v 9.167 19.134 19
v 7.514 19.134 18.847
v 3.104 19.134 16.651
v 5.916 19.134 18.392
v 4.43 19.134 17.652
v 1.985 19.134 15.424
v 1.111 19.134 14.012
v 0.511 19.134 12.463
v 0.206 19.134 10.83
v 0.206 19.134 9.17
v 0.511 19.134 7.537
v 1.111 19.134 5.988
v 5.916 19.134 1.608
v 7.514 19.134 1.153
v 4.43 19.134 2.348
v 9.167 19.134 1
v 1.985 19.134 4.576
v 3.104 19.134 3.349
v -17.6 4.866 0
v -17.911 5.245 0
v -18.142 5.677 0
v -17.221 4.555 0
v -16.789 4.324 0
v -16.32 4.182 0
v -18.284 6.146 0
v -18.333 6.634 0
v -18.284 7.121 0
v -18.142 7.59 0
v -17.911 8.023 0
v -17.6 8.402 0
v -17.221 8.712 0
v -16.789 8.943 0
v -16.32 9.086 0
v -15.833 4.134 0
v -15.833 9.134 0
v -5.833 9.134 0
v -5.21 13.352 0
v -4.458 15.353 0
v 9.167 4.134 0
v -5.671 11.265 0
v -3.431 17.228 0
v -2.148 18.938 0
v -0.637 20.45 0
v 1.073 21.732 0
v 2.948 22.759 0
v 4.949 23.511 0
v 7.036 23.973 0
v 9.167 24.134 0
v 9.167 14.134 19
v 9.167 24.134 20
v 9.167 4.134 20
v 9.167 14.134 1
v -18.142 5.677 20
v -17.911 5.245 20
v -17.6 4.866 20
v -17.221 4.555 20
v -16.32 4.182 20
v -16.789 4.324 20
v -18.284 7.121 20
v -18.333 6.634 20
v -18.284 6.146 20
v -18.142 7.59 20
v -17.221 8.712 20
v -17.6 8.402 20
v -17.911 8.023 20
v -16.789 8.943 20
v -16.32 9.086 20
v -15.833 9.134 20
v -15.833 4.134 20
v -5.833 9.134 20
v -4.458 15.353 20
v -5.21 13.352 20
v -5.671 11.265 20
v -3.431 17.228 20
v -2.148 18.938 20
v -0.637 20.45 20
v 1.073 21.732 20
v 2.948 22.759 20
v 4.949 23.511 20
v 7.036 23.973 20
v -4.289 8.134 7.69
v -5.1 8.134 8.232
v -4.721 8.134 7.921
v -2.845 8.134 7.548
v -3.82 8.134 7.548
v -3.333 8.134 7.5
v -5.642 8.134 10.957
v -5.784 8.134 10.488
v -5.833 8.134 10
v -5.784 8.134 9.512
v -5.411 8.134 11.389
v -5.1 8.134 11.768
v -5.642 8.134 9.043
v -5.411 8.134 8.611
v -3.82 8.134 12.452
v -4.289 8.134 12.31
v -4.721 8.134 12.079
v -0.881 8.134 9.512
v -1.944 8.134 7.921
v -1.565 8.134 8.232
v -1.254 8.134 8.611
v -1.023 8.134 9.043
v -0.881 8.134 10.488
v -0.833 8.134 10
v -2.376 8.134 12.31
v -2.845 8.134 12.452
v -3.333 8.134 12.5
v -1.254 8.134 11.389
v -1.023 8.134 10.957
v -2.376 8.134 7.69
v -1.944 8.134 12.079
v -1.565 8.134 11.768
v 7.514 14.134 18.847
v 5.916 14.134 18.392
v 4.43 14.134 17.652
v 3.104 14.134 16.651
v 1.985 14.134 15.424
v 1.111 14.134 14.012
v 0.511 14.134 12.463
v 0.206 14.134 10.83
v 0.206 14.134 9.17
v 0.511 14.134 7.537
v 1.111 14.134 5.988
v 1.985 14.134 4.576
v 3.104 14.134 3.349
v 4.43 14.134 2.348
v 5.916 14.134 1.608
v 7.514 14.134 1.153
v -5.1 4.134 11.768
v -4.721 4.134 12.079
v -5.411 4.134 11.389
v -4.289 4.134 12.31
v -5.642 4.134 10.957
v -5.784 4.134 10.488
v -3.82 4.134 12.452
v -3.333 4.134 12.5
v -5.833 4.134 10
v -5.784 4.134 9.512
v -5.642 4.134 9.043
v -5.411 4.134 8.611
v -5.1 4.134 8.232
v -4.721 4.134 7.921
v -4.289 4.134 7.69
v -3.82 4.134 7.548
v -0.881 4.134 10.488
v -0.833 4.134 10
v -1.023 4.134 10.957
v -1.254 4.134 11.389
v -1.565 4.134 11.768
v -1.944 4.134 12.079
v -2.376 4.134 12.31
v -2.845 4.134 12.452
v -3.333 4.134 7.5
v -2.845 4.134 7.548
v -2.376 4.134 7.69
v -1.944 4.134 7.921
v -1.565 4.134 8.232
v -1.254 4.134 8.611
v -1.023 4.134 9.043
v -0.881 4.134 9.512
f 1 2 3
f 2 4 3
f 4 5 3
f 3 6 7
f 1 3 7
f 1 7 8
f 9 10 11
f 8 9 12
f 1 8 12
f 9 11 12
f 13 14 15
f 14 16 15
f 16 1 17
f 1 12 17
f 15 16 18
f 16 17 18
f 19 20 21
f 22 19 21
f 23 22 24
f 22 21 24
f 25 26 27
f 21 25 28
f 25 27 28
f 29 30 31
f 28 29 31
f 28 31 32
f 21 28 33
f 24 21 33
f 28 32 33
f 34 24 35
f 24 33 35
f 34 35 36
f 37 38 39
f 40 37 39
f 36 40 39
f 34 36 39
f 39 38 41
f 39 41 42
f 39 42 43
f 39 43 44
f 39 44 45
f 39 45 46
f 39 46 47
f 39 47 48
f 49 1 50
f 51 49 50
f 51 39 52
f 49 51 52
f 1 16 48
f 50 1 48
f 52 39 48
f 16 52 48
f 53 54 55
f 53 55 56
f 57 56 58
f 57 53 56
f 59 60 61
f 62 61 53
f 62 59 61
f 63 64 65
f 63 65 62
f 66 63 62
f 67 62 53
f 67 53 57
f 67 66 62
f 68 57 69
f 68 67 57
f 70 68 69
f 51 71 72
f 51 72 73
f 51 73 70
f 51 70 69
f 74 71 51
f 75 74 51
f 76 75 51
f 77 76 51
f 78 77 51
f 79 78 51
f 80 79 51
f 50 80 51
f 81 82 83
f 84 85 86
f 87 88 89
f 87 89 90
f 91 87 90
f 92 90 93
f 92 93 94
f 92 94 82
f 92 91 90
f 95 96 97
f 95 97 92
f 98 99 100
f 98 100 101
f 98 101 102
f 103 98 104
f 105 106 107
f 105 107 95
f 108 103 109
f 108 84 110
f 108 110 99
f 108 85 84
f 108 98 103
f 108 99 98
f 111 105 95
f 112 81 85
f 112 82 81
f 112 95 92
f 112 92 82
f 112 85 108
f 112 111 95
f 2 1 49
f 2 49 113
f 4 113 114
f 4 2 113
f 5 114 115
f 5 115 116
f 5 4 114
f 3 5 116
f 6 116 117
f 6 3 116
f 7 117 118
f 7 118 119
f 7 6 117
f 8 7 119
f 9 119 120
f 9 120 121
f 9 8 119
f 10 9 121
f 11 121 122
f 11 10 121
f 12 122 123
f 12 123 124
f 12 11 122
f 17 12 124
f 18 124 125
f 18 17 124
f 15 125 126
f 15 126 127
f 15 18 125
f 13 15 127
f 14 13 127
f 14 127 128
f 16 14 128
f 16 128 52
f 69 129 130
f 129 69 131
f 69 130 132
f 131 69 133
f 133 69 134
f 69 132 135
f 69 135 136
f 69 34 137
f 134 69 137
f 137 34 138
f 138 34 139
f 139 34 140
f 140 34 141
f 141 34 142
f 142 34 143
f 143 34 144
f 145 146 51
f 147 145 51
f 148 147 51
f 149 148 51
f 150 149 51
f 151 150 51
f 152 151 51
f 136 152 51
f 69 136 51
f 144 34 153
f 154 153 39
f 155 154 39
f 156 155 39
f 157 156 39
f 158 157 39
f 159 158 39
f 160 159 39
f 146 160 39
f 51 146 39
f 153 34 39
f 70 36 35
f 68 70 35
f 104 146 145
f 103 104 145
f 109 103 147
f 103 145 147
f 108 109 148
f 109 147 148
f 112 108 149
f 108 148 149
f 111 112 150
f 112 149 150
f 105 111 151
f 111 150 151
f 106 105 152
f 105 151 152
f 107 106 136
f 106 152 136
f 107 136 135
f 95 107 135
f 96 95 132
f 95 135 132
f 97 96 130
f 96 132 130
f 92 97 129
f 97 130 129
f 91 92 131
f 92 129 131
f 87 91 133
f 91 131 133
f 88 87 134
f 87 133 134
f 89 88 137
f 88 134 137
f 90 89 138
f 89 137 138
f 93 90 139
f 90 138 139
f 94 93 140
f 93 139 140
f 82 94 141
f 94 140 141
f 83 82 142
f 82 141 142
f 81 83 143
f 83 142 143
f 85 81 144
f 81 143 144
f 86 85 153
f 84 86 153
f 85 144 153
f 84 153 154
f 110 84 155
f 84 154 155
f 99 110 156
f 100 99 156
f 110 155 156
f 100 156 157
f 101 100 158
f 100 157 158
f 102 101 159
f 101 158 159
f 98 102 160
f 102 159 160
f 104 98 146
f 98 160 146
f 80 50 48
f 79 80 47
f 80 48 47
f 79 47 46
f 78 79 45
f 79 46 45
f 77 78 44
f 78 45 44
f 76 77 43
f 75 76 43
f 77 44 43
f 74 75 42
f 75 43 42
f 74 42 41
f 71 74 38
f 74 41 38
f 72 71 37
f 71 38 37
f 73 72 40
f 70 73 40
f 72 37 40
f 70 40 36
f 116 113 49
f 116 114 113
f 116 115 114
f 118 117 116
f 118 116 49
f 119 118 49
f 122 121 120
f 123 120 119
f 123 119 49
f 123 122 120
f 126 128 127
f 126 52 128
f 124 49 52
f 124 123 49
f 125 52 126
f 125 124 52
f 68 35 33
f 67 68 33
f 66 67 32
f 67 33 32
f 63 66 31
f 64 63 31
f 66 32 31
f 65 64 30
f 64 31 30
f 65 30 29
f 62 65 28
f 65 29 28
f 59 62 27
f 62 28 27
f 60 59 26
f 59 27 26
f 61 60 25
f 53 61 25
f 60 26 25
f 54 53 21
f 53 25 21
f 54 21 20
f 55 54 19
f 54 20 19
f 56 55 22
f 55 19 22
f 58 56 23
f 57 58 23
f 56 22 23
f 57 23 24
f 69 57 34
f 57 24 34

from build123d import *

# Parameters (mm, degrees)
F1_DEPTH = 20
F2_W     = 5
F2_H     = 9
F4_R     = 2.5
F5_DEPTH = 4


with BuildPart() as f1:
    # F0 (on Top) → F1 (new body)
    with BuildSketch(Plane.XY):
        with BuildLine():
            ThreePointArc((-15.832526, 9.133746), (-18.332526, 6.633745), (-15.832526, 4.133745))
            Line((-15.832526, 4.133745), (9.167474, 4.133745))
            Line((9.167474, 4.133745), (9.167474, 24.133746))
            ThreePointArc((9.167474, 24.133746), (-1.41941, 19.72063), (-5.832526, 9.133746))
            Line((-5.832526, 9.133746), (-15.832526, 9.133746))
        make_face()
    extrude(amount=F1_DEPTH)

    # F2 (on face) → F3 (revolve, cut)
    with BuildSketch(Plane.YZ.offset(9.167474)):
        with Locations((16.633746, 14.5)):
            Rectangle(F2_W, F2_H)
    revolve(axis=Axis((9.167474, 0.748294, 10), (0, -1, 0)), mode=Mode.SUBTRACT)

    # F4 (on face) → F5 (cut)
    with BuildSketch(Plane.XZ.offset(-4.133745)):
        with Locations((-3.332526, 10)):
            Circle(F4_R)
    extrude(amount=-F5_DEPTH, mode=Mode.SUBTRACT)


solid = f1.part
